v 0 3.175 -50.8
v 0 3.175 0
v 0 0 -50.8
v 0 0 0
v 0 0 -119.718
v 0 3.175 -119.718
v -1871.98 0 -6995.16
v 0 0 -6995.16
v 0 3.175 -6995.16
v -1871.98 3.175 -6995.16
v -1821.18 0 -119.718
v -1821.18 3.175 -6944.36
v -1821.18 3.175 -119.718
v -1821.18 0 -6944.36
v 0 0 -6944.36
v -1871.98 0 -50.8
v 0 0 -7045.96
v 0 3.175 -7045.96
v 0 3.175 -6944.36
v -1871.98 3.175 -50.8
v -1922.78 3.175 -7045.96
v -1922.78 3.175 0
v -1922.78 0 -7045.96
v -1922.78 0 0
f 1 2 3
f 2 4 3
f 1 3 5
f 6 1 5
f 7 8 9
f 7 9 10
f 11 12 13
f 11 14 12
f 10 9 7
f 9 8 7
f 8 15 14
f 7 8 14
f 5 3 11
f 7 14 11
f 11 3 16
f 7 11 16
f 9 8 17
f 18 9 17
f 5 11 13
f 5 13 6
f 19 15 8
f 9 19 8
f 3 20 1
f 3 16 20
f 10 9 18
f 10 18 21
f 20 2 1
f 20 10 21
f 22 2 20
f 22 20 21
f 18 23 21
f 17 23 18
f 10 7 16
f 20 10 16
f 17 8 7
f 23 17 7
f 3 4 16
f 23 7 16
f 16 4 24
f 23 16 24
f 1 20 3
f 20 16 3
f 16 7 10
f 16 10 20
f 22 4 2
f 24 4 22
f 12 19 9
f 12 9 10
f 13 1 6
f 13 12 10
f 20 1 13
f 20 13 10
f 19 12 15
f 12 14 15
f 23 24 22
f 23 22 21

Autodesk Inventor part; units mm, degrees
ref_plane "YZ Plane" through (0, 0, 0) normal (1, 0, 0) x (0, 1, 0)
ref_plane "XZ Plane" through (0, 0, 0) normal (0, 1, 0) x (-1, 0, 0)
ref_plane "XY Plane" through (0, 0, 0) normal (0, 0, 1) x (1, 0, 0)
sketch "Sketch1" plane through (0, 0, 0) normal (0, 1, 0) x (-1, 0, 0)
  line L0 (0, 0) -> (1922.78, 0)
  line L1 (1922.78, 0) -> (1922.78, -7045.96)
  line L2 (1922.78, -7045.96) -> (0, -7045.96)
  line L3 (0, -6995.16) -> (1871.98, -6995.16)
  line L4 (1871.98, -6995.16) -> (1871.98, -50.8)
  line L5 (1871.98, -50.8) -> (0, -50.8)
  line L6 (0, 0) -> (0, -50.8)
  line L7 (0, -6995.16) -> (0, -7045.96)
  line L8 (1821.18, -6944.36) -> (0, -6944.36)
  line L9 (1821.18, -6944.36) -> (1821.18, -119.7177)
  line L10 (0, -6944.36) -> (0, -6995.16)
  line L11 (1821.18, -119.7177) -> (0, -119.7177)
  line L12 (0, -50.8) -> (0, -119.7177)
  dimension "d0" = 1922.78
  dimension "d1" = 7045.96
  dimension "d2" = 1922.78
  dimension "d3" = 50.8
  dimension "d6" = 50.8
  dimension "d7" = 50.8
extrude "Extrusion1" add sketch "Sketch1" along normal blind 3.175 contours L0 L1 L2 L7 L3 L4 L5 L6
extrude "Extrusion2" add sketch "Sketch1" along normal blind 3.175 separate body contours L5 L4 L3 L10 L8 L9 L11 L12
equation "\"d0\" = d2"
properties part number "Trim_Red_02"
